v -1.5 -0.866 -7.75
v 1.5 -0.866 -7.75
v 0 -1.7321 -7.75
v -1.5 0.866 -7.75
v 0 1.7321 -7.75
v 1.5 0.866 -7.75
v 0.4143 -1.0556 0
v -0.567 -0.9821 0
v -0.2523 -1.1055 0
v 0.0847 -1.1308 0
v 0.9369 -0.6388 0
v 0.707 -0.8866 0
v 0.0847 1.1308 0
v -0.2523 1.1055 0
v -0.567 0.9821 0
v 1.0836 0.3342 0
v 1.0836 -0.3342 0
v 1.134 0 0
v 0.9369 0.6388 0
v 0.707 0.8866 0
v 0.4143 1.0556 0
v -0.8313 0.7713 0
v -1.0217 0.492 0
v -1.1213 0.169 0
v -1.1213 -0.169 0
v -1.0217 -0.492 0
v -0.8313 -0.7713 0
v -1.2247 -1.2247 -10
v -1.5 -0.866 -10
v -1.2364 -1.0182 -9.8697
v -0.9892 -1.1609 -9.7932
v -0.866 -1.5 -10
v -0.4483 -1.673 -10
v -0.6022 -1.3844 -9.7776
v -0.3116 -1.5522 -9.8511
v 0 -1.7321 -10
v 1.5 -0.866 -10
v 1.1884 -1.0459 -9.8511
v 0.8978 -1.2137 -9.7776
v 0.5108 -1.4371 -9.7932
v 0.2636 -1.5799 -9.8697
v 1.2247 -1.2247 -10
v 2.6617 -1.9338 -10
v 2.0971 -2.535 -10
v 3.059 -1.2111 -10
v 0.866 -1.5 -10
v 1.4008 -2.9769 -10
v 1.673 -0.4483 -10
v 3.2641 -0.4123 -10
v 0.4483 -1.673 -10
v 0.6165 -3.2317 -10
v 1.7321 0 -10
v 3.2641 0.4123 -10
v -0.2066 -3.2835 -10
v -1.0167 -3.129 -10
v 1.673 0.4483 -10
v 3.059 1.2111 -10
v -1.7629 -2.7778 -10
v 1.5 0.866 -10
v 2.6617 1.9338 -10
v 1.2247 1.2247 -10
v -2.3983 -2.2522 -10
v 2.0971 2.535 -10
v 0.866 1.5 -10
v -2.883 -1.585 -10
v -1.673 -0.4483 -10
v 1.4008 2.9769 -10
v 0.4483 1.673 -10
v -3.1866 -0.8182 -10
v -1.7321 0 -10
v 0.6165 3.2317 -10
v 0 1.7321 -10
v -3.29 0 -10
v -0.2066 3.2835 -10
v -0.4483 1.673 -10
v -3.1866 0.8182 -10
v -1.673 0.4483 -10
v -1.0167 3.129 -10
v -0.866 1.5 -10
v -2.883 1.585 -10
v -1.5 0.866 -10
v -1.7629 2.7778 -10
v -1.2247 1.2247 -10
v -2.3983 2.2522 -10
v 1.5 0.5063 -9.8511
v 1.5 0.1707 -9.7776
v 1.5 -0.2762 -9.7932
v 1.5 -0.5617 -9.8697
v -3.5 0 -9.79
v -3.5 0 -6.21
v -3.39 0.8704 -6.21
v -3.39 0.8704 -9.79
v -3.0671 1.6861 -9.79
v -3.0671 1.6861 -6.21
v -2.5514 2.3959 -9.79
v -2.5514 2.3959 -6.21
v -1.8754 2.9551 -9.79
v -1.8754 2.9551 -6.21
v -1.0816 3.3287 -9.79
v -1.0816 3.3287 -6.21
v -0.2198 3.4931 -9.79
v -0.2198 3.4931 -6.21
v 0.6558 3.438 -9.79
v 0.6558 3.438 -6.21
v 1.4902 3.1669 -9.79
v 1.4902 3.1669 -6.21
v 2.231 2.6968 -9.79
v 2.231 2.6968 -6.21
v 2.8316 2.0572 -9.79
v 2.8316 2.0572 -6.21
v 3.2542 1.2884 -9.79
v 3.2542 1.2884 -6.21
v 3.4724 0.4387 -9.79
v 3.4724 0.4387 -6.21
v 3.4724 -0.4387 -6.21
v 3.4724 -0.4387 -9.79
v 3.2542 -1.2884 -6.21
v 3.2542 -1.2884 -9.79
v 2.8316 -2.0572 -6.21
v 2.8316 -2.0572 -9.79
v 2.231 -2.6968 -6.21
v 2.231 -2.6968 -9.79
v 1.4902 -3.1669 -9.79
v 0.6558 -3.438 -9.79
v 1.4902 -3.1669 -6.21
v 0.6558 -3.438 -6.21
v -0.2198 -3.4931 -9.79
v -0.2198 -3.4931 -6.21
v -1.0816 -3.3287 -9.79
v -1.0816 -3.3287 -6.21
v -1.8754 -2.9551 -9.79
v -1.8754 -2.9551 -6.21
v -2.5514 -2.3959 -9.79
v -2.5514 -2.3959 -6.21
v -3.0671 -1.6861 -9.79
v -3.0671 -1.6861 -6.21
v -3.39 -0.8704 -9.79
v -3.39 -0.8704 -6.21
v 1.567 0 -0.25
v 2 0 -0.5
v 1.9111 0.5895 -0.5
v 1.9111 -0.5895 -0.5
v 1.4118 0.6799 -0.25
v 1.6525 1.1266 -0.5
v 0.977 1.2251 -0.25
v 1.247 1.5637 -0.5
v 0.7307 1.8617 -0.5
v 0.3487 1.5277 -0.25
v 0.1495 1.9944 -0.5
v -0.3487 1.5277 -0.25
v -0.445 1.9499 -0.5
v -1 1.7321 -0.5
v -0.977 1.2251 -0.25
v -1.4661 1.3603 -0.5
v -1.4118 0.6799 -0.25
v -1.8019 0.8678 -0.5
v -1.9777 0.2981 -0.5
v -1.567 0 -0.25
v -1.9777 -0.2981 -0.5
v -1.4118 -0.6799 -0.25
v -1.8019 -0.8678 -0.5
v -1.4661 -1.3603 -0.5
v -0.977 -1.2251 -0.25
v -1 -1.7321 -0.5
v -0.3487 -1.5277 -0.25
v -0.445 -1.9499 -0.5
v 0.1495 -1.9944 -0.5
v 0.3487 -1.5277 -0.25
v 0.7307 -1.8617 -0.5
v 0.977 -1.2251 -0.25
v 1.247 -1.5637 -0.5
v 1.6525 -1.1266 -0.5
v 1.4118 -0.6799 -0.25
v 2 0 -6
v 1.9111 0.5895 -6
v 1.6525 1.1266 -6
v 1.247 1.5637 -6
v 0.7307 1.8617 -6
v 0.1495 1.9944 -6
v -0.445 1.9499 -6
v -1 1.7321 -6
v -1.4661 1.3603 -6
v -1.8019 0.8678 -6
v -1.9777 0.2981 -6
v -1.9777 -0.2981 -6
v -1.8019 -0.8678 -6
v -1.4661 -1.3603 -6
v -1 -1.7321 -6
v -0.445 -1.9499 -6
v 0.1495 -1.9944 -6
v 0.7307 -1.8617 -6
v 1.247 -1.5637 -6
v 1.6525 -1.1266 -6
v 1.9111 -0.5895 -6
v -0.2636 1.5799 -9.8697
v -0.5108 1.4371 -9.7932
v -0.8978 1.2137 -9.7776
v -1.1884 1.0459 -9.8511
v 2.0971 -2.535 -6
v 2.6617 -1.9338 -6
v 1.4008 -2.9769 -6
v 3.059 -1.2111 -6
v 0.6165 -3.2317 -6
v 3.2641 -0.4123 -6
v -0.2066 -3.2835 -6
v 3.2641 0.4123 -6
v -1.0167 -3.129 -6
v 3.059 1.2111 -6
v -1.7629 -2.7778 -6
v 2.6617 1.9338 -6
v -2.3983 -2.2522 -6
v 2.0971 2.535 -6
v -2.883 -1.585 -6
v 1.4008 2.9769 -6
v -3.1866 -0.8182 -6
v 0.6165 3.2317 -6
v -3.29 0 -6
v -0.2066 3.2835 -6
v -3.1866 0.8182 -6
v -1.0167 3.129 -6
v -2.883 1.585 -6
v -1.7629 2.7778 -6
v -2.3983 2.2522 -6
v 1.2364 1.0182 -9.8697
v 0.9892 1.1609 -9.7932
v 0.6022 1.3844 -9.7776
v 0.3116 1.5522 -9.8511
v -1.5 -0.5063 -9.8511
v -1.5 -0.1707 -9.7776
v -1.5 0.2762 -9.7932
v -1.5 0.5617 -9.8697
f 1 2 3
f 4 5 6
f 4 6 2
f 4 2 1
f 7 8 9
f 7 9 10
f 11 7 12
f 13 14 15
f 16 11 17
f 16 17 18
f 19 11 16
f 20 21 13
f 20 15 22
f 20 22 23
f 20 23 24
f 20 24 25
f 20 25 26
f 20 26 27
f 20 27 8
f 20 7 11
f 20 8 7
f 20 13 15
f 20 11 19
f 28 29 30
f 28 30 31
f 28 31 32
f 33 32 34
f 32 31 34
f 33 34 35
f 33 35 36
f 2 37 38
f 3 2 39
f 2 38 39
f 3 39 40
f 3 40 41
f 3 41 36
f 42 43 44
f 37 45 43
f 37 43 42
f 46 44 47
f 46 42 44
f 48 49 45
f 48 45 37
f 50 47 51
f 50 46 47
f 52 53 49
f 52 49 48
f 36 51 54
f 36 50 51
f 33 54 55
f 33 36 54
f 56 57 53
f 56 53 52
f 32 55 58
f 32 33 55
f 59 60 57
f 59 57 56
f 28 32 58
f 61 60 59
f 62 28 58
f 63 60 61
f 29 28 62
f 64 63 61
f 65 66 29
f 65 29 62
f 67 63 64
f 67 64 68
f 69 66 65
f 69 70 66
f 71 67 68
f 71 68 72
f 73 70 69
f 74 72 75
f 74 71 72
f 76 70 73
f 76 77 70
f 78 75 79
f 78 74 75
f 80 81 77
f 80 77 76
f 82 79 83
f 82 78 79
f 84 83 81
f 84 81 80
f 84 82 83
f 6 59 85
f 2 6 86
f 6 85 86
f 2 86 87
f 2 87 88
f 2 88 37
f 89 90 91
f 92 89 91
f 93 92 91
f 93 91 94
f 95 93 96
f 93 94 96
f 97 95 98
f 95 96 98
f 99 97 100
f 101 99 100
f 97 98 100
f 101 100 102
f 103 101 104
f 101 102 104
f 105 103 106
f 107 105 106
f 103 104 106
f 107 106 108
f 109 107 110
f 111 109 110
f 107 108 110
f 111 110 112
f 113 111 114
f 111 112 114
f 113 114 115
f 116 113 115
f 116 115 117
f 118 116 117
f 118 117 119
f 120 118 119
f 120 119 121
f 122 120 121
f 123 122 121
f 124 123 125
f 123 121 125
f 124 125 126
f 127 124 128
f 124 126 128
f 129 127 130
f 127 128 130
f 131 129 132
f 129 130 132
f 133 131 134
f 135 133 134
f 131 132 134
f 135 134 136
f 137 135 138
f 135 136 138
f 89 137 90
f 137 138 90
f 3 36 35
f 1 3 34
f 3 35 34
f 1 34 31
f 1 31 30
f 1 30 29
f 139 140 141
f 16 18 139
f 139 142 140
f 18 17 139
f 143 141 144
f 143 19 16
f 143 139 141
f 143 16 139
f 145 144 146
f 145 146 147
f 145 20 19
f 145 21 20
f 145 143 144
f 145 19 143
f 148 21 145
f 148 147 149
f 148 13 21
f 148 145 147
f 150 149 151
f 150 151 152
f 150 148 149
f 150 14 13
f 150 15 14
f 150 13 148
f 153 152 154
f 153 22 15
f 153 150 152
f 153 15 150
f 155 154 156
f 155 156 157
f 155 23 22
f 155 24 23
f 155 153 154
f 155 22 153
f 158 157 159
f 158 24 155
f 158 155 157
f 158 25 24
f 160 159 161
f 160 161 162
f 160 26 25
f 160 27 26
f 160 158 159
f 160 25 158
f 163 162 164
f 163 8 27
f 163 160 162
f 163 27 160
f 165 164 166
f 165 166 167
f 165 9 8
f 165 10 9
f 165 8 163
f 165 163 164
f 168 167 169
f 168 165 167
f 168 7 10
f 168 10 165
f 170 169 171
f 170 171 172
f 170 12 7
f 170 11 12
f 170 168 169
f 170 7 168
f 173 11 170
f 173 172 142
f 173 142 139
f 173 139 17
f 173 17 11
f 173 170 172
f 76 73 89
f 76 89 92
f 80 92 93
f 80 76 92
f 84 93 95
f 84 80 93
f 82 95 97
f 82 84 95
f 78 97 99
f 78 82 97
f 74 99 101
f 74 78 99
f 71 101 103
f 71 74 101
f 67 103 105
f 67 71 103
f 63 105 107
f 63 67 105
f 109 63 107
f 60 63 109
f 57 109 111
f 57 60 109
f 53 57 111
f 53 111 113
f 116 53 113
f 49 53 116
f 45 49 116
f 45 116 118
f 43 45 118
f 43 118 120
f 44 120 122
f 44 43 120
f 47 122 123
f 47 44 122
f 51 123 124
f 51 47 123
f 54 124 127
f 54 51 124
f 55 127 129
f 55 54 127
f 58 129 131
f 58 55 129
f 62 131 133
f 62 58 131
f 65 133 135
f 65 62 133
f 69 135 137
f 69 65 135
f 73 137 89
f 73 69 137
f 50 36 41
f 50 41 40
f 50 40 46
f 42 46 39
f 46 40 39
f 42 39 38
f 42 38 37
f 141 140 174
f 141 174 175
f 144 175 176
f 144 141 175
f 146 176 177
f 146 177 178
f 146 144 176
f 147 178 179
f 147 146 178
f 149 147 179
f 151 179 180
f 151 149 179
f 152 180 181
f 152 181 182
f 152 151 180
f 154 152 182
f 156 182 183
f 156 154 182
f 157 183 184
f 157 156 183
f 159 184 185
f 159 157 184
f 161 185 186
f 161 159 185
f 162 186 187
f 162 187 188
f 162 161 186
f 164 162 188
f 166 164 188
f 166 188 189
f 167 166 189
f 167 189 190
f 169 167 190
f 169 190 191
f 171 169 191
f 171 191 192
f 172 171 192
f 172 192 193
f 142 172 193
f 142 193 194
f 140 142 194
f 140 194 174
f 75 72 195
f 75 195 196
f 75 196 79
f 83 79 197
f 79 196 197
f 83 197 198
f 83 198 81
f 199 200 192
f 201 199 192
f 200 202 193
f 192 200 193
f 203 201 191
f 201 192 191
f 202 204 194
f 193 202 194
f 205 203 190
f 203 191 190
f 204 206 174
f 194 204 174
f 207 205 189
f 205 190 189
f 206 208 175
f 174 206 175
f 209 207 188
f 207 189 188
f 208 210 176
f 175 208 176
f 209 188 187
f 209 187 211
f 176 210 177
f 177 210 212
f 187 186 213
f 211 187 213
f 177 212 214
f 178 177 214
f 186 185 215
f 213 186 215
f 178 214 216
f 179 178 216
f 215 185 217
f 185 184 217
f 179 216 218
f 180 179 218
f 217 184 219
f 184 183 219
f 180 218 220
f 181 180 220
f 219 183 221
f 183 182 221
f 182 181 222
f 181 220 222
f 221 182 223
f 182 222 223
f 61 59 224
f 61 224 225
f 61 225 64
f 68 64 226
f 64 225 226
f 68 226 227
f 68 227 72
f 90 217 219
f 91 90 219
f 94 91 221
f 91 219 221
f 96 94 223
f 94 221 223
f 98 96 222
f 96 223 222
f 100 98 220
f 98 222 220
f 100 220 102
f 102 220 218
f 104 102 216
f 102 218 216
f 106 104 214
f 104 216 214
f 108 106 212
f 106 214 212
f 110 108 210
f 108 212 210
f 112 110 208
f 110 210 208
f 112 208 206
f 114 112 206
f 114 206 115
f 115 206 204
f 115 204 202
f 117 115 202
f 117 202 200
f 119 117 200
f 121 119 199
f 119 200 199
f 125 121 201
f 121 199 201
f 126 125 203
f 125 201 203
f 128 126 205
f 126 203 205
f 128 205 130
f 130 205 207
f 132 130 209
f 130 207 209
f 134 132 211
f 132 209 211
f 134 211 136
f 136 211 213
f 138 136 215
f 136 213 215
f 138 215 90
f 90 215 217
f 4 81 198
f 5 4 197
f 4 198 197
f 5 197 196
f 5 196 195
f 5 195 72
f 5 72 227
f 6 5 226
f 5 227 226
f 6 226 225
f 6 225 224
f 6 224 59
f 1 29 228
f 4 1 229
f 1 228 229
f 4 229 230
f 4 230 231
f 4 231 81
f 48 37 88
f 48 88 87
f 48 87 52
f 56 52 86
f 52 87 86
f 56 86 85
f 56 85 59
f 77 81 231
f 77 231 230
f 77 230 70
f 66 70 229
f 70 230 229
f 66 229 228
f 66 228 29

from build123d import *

# Parameters (mm, degrees)
SKETCH1_R           = 2
EXTRUDE1_DEPTH      = 6
CUT_SWEEP1_PITCH    = 0.7
SKETCH6_R           = 3.5
EXTRUDE2_DEPTH      = 4
CUT_EXTRUDE1_DEPTH  = 2.25
CHAMFER1_SIZE       = 0.21
SKETCH12_R          = 2
BOSS_EXTRUDE1_DEPTH = 6
CHAMFER2_SIZE       = 0.5
CHAMFER2_SIZE_2     = 0.866025404


with BuildPart() as part:
    # Sketch1 → Extrude1 (new body)
    with BuildSketch(Plane.XY):
        Circle(SKETCH1_R)
    extrude(amount=-EXTRUDE1_DEPTH)

    # Cut-Sweep1: the profile of Sketch3 profile screwed along a right-hand helix of 9.571429 turns, 6 arcs to a turn; built about Z, then put on its axis
    cut_sweep1_z = Axis((0, 0, 0), (0, 0, 1))
    cut_sweep1_corners = [(2.0003, 0, -0.612673205), (1.545336663, 0, -0.35), (1.545336663, 0, -0.2625), (2.0003, 0, 0.000173205)]
    with BuildLine(mode=Mode.PRIVATE) as cut_sweep1_profile:
        Line(cut_sweep1_corners[0], cut_sweep1_corners[1])
        Line(cut_sweep1_corners[1], cut_sweep1_corners[2])
        Line(cut_sweep1_corners[2], cut_sweep1_corners[3])
        Line(cut_sweep1_corners[3], cut_sweep1_corners[0])
    cut_sweep1_cap = Face(cut_sweep1_profile.wire())
    cut_sweep1_turn_angles = [0, 30, 60, 90, 120, 150, 180, 210, 240, 270, 300, 330, 360]
    cut_sweep1_turn_weights = [1, 0.8660254037844387, 1, 0.8660254037844387, 1, 0.8660254037844387, 1, 0.8660254037844387, 1, 0.8660254037844387, 1, 0.8660254037844387, 1]
    cut_sweep1_turn_rails = [Edge.make_bspline([Vector(p[0], p[1], 0).rotate(cut_sweep1_z, cut_sweep1_turn_angles[k]) / cut_sweep1_turn_weights[k] + Vector(0, 0, p[2] + CUT_SWEEP1_PITCH * cut_sweep1_turn_angles[k] / 360) for k in range(13)], [0, 0, 0, 1, 1, 2, 2, 3, 3, 4, 4, 5, 5, 6, 6, 6], 2, cut_sweep1_turn_weights) for p in cut_sweep1_corners]
    cut_sweep1_turn_sides = [Face.make_surface_from_curves(cut_sweep1_turn_rails[p[0]], cut_sweep1_turn_rails[p[1]]) for p in [(0, 1), (1, 2), (2, 3), (3, 0)]]
    cut_sweep1_last_angles = [3240, 3270, 3300, 3330, 3360, 3390, 3420, 3432.857142857, 3445.714285714]
    cut_sweep1_last_weights = [1, 0.8660254037844387, 1, 0.8660254037844387, 1, 0.8660254037844387, 1, 0.9749279121818499, 1]
    cut_sweep1_last_rails = [Edge.make_bspline([Vector(p[0], p[1], 0).rotate(cut_sweep1_z, cut_sweep1_last_angles[k]) / cut_sweep1_last_weights[k] + Vector(0, 0, p[2] + CUT_SWEEP1_PITCH * cut_sweep1_last_angles[k] / 360) for k in range(9)], [0, 0, 0, 1, 1, 2, 2, 3, 3, 4, 4, 4], 2, cut_sweep1_last_weights) for p in cut_sweep1_corners]
    cut_sweep1_last_sides = [Face.make_surface_from_curves(cut_sweep1_last_rails[p[0]], cut_sweep1_last_rails[p[1]]) for p in [(0, 1), (1, 2), (2, 3), (3, 0)]]
    cut_sweep1 = Plane(origin=(0, 0, 0), x_dir=(0, 1, 0), z_dir=(0, 0, -1)) * Solid(Shell([*[p.moved(Location((0, 0, CUT_SWEEP1_PITCH * i))) for i in range(9) for p in cut_sweep1_turn_sides], *cut_sweep1_last_sides, cut_sweep1_cap, cut_sweep1_cap.rotate(cut_sweep1_z, 3445.714285714).moved(Location((0, 0, CUT_SWEEP1_PITCH * 3445.714285714 / 360)))]))
    add(cut_sweep1, mode=Mode.SUBTRACT)

    # Sketch4 → Cut-Revolve1 (revolve, cut)
    with BuildSketch(Plane(origin=(0, 0, 0), x_dir=(0, 0, -1), z_dir=(1, 0, 0)), mode=Mode.PRIVATE) as cut_revolve1_sk:
        Polygon((0.496211411, 2), (0, 1.291336663), (0, 2), align=None)
    revolve(cut_revolve1_sk.sketch.rotate(Axis((0, 0, 0), (0, 0, -1)), 271.401126896), axis=Axis((0, 0, 0), (0, 0, -1)), mode=Mode.SUBTRACT)

    # Sketch6 → Extrude2 (add)
    with BuildSketch(Plane(origin=(0, 0, -6), x_dir=(-1, 0, 0), z_dir=(0, 0, -1))):
        Circle(SKETCH6_R)
    extrude(amount=EXTRUDE2_DEPTH)

    # Sketch7 → Cut-Extrude1 (cut)
    with BuildSketch(Plane(origin=(0, 0, -10), x_dir=(-1, 0, 0), z_dir=(0, 0, -1))):
        Polygon((0, 1.732050808), (-1.5, 0.866025404), (-1.5, -0.866025404), (0, -1.732050808), (1.5, -0.866025404), (1.5, 0.866025404), align=None)
    extrude(amount=-CUT_EXTRUDE1_DEPTH, mode=Mode.SUBTRACT)

    # Cut-Extrude2 cone 1 section (through the dimple's axis) → Cut-Extrude2 (revolve, cut)
    with BuildSketch(Plane(origin=(0, 0, -10), x_dir=(0, 1, 0), z_dir=(1, 0, 0))):
        Polygon((0, 0), (1.732050808, 0), (0, 1.732050808), align=None)
    revolve(axis=Axis((0, 0, -10), (0, 0, 1)), mode=Mode.SUBTRACT)

    # Chamfer1
    chamfer1_edges = [part.edges().sort_by_distance(p)[0] for p in [
        (3.5, 0, -6),
        (3.5, 0, -10),
    ]]
    chamfer(chamfer1_edges, length=CHAMFER1_SIZE)

    # Sketch10 → Revolve1 (revolve)
    with BuildSketch(Plane(origin=(0, 0, 0), x_dir=(0, 0, -1), z_dir=(1, 0, 0)), mode=Mode.PRIVATE) as revolve1_sk:
        Polygon((6, 2), (6, 0), (4.996572875, 0), (5.825, 2), align=None)
    revolve(revolve1_sk.sketch.rotate(Axis((0, 0, -6), (0, 0, 1)), 270), axis=Axis((0, 0, -6), (0, 0, 1)))

    # Sketch12 → Boss-Extrude1 (add)
    with BuildSketch(Plane.XY):
        Circle(SKETCH12_R)
    extrude(amount=-BOSS_EXTRUDE1_DEPTH)

    # Chamfer2
    # the kernel refuses this chamfer: 0.866025404, 0.5 mm, written as the material it takes off along each edge
    with BuildSketch(Plane(origin=(0, 0, 0), x_dir=(1, 0, 0), z_dir=(0, -1, 0))) as chamfer2_piece_1:
        Polygon((2, -CHAMFER2_SIZE), (2 - CHAMFER2_SIZE_2, 0), (2, 0), align=None)
    revolve(axis=Axis((0, 0, 0), (0, 0, 1)), mode=Mode.SUBTRACT)


solid = part.part
